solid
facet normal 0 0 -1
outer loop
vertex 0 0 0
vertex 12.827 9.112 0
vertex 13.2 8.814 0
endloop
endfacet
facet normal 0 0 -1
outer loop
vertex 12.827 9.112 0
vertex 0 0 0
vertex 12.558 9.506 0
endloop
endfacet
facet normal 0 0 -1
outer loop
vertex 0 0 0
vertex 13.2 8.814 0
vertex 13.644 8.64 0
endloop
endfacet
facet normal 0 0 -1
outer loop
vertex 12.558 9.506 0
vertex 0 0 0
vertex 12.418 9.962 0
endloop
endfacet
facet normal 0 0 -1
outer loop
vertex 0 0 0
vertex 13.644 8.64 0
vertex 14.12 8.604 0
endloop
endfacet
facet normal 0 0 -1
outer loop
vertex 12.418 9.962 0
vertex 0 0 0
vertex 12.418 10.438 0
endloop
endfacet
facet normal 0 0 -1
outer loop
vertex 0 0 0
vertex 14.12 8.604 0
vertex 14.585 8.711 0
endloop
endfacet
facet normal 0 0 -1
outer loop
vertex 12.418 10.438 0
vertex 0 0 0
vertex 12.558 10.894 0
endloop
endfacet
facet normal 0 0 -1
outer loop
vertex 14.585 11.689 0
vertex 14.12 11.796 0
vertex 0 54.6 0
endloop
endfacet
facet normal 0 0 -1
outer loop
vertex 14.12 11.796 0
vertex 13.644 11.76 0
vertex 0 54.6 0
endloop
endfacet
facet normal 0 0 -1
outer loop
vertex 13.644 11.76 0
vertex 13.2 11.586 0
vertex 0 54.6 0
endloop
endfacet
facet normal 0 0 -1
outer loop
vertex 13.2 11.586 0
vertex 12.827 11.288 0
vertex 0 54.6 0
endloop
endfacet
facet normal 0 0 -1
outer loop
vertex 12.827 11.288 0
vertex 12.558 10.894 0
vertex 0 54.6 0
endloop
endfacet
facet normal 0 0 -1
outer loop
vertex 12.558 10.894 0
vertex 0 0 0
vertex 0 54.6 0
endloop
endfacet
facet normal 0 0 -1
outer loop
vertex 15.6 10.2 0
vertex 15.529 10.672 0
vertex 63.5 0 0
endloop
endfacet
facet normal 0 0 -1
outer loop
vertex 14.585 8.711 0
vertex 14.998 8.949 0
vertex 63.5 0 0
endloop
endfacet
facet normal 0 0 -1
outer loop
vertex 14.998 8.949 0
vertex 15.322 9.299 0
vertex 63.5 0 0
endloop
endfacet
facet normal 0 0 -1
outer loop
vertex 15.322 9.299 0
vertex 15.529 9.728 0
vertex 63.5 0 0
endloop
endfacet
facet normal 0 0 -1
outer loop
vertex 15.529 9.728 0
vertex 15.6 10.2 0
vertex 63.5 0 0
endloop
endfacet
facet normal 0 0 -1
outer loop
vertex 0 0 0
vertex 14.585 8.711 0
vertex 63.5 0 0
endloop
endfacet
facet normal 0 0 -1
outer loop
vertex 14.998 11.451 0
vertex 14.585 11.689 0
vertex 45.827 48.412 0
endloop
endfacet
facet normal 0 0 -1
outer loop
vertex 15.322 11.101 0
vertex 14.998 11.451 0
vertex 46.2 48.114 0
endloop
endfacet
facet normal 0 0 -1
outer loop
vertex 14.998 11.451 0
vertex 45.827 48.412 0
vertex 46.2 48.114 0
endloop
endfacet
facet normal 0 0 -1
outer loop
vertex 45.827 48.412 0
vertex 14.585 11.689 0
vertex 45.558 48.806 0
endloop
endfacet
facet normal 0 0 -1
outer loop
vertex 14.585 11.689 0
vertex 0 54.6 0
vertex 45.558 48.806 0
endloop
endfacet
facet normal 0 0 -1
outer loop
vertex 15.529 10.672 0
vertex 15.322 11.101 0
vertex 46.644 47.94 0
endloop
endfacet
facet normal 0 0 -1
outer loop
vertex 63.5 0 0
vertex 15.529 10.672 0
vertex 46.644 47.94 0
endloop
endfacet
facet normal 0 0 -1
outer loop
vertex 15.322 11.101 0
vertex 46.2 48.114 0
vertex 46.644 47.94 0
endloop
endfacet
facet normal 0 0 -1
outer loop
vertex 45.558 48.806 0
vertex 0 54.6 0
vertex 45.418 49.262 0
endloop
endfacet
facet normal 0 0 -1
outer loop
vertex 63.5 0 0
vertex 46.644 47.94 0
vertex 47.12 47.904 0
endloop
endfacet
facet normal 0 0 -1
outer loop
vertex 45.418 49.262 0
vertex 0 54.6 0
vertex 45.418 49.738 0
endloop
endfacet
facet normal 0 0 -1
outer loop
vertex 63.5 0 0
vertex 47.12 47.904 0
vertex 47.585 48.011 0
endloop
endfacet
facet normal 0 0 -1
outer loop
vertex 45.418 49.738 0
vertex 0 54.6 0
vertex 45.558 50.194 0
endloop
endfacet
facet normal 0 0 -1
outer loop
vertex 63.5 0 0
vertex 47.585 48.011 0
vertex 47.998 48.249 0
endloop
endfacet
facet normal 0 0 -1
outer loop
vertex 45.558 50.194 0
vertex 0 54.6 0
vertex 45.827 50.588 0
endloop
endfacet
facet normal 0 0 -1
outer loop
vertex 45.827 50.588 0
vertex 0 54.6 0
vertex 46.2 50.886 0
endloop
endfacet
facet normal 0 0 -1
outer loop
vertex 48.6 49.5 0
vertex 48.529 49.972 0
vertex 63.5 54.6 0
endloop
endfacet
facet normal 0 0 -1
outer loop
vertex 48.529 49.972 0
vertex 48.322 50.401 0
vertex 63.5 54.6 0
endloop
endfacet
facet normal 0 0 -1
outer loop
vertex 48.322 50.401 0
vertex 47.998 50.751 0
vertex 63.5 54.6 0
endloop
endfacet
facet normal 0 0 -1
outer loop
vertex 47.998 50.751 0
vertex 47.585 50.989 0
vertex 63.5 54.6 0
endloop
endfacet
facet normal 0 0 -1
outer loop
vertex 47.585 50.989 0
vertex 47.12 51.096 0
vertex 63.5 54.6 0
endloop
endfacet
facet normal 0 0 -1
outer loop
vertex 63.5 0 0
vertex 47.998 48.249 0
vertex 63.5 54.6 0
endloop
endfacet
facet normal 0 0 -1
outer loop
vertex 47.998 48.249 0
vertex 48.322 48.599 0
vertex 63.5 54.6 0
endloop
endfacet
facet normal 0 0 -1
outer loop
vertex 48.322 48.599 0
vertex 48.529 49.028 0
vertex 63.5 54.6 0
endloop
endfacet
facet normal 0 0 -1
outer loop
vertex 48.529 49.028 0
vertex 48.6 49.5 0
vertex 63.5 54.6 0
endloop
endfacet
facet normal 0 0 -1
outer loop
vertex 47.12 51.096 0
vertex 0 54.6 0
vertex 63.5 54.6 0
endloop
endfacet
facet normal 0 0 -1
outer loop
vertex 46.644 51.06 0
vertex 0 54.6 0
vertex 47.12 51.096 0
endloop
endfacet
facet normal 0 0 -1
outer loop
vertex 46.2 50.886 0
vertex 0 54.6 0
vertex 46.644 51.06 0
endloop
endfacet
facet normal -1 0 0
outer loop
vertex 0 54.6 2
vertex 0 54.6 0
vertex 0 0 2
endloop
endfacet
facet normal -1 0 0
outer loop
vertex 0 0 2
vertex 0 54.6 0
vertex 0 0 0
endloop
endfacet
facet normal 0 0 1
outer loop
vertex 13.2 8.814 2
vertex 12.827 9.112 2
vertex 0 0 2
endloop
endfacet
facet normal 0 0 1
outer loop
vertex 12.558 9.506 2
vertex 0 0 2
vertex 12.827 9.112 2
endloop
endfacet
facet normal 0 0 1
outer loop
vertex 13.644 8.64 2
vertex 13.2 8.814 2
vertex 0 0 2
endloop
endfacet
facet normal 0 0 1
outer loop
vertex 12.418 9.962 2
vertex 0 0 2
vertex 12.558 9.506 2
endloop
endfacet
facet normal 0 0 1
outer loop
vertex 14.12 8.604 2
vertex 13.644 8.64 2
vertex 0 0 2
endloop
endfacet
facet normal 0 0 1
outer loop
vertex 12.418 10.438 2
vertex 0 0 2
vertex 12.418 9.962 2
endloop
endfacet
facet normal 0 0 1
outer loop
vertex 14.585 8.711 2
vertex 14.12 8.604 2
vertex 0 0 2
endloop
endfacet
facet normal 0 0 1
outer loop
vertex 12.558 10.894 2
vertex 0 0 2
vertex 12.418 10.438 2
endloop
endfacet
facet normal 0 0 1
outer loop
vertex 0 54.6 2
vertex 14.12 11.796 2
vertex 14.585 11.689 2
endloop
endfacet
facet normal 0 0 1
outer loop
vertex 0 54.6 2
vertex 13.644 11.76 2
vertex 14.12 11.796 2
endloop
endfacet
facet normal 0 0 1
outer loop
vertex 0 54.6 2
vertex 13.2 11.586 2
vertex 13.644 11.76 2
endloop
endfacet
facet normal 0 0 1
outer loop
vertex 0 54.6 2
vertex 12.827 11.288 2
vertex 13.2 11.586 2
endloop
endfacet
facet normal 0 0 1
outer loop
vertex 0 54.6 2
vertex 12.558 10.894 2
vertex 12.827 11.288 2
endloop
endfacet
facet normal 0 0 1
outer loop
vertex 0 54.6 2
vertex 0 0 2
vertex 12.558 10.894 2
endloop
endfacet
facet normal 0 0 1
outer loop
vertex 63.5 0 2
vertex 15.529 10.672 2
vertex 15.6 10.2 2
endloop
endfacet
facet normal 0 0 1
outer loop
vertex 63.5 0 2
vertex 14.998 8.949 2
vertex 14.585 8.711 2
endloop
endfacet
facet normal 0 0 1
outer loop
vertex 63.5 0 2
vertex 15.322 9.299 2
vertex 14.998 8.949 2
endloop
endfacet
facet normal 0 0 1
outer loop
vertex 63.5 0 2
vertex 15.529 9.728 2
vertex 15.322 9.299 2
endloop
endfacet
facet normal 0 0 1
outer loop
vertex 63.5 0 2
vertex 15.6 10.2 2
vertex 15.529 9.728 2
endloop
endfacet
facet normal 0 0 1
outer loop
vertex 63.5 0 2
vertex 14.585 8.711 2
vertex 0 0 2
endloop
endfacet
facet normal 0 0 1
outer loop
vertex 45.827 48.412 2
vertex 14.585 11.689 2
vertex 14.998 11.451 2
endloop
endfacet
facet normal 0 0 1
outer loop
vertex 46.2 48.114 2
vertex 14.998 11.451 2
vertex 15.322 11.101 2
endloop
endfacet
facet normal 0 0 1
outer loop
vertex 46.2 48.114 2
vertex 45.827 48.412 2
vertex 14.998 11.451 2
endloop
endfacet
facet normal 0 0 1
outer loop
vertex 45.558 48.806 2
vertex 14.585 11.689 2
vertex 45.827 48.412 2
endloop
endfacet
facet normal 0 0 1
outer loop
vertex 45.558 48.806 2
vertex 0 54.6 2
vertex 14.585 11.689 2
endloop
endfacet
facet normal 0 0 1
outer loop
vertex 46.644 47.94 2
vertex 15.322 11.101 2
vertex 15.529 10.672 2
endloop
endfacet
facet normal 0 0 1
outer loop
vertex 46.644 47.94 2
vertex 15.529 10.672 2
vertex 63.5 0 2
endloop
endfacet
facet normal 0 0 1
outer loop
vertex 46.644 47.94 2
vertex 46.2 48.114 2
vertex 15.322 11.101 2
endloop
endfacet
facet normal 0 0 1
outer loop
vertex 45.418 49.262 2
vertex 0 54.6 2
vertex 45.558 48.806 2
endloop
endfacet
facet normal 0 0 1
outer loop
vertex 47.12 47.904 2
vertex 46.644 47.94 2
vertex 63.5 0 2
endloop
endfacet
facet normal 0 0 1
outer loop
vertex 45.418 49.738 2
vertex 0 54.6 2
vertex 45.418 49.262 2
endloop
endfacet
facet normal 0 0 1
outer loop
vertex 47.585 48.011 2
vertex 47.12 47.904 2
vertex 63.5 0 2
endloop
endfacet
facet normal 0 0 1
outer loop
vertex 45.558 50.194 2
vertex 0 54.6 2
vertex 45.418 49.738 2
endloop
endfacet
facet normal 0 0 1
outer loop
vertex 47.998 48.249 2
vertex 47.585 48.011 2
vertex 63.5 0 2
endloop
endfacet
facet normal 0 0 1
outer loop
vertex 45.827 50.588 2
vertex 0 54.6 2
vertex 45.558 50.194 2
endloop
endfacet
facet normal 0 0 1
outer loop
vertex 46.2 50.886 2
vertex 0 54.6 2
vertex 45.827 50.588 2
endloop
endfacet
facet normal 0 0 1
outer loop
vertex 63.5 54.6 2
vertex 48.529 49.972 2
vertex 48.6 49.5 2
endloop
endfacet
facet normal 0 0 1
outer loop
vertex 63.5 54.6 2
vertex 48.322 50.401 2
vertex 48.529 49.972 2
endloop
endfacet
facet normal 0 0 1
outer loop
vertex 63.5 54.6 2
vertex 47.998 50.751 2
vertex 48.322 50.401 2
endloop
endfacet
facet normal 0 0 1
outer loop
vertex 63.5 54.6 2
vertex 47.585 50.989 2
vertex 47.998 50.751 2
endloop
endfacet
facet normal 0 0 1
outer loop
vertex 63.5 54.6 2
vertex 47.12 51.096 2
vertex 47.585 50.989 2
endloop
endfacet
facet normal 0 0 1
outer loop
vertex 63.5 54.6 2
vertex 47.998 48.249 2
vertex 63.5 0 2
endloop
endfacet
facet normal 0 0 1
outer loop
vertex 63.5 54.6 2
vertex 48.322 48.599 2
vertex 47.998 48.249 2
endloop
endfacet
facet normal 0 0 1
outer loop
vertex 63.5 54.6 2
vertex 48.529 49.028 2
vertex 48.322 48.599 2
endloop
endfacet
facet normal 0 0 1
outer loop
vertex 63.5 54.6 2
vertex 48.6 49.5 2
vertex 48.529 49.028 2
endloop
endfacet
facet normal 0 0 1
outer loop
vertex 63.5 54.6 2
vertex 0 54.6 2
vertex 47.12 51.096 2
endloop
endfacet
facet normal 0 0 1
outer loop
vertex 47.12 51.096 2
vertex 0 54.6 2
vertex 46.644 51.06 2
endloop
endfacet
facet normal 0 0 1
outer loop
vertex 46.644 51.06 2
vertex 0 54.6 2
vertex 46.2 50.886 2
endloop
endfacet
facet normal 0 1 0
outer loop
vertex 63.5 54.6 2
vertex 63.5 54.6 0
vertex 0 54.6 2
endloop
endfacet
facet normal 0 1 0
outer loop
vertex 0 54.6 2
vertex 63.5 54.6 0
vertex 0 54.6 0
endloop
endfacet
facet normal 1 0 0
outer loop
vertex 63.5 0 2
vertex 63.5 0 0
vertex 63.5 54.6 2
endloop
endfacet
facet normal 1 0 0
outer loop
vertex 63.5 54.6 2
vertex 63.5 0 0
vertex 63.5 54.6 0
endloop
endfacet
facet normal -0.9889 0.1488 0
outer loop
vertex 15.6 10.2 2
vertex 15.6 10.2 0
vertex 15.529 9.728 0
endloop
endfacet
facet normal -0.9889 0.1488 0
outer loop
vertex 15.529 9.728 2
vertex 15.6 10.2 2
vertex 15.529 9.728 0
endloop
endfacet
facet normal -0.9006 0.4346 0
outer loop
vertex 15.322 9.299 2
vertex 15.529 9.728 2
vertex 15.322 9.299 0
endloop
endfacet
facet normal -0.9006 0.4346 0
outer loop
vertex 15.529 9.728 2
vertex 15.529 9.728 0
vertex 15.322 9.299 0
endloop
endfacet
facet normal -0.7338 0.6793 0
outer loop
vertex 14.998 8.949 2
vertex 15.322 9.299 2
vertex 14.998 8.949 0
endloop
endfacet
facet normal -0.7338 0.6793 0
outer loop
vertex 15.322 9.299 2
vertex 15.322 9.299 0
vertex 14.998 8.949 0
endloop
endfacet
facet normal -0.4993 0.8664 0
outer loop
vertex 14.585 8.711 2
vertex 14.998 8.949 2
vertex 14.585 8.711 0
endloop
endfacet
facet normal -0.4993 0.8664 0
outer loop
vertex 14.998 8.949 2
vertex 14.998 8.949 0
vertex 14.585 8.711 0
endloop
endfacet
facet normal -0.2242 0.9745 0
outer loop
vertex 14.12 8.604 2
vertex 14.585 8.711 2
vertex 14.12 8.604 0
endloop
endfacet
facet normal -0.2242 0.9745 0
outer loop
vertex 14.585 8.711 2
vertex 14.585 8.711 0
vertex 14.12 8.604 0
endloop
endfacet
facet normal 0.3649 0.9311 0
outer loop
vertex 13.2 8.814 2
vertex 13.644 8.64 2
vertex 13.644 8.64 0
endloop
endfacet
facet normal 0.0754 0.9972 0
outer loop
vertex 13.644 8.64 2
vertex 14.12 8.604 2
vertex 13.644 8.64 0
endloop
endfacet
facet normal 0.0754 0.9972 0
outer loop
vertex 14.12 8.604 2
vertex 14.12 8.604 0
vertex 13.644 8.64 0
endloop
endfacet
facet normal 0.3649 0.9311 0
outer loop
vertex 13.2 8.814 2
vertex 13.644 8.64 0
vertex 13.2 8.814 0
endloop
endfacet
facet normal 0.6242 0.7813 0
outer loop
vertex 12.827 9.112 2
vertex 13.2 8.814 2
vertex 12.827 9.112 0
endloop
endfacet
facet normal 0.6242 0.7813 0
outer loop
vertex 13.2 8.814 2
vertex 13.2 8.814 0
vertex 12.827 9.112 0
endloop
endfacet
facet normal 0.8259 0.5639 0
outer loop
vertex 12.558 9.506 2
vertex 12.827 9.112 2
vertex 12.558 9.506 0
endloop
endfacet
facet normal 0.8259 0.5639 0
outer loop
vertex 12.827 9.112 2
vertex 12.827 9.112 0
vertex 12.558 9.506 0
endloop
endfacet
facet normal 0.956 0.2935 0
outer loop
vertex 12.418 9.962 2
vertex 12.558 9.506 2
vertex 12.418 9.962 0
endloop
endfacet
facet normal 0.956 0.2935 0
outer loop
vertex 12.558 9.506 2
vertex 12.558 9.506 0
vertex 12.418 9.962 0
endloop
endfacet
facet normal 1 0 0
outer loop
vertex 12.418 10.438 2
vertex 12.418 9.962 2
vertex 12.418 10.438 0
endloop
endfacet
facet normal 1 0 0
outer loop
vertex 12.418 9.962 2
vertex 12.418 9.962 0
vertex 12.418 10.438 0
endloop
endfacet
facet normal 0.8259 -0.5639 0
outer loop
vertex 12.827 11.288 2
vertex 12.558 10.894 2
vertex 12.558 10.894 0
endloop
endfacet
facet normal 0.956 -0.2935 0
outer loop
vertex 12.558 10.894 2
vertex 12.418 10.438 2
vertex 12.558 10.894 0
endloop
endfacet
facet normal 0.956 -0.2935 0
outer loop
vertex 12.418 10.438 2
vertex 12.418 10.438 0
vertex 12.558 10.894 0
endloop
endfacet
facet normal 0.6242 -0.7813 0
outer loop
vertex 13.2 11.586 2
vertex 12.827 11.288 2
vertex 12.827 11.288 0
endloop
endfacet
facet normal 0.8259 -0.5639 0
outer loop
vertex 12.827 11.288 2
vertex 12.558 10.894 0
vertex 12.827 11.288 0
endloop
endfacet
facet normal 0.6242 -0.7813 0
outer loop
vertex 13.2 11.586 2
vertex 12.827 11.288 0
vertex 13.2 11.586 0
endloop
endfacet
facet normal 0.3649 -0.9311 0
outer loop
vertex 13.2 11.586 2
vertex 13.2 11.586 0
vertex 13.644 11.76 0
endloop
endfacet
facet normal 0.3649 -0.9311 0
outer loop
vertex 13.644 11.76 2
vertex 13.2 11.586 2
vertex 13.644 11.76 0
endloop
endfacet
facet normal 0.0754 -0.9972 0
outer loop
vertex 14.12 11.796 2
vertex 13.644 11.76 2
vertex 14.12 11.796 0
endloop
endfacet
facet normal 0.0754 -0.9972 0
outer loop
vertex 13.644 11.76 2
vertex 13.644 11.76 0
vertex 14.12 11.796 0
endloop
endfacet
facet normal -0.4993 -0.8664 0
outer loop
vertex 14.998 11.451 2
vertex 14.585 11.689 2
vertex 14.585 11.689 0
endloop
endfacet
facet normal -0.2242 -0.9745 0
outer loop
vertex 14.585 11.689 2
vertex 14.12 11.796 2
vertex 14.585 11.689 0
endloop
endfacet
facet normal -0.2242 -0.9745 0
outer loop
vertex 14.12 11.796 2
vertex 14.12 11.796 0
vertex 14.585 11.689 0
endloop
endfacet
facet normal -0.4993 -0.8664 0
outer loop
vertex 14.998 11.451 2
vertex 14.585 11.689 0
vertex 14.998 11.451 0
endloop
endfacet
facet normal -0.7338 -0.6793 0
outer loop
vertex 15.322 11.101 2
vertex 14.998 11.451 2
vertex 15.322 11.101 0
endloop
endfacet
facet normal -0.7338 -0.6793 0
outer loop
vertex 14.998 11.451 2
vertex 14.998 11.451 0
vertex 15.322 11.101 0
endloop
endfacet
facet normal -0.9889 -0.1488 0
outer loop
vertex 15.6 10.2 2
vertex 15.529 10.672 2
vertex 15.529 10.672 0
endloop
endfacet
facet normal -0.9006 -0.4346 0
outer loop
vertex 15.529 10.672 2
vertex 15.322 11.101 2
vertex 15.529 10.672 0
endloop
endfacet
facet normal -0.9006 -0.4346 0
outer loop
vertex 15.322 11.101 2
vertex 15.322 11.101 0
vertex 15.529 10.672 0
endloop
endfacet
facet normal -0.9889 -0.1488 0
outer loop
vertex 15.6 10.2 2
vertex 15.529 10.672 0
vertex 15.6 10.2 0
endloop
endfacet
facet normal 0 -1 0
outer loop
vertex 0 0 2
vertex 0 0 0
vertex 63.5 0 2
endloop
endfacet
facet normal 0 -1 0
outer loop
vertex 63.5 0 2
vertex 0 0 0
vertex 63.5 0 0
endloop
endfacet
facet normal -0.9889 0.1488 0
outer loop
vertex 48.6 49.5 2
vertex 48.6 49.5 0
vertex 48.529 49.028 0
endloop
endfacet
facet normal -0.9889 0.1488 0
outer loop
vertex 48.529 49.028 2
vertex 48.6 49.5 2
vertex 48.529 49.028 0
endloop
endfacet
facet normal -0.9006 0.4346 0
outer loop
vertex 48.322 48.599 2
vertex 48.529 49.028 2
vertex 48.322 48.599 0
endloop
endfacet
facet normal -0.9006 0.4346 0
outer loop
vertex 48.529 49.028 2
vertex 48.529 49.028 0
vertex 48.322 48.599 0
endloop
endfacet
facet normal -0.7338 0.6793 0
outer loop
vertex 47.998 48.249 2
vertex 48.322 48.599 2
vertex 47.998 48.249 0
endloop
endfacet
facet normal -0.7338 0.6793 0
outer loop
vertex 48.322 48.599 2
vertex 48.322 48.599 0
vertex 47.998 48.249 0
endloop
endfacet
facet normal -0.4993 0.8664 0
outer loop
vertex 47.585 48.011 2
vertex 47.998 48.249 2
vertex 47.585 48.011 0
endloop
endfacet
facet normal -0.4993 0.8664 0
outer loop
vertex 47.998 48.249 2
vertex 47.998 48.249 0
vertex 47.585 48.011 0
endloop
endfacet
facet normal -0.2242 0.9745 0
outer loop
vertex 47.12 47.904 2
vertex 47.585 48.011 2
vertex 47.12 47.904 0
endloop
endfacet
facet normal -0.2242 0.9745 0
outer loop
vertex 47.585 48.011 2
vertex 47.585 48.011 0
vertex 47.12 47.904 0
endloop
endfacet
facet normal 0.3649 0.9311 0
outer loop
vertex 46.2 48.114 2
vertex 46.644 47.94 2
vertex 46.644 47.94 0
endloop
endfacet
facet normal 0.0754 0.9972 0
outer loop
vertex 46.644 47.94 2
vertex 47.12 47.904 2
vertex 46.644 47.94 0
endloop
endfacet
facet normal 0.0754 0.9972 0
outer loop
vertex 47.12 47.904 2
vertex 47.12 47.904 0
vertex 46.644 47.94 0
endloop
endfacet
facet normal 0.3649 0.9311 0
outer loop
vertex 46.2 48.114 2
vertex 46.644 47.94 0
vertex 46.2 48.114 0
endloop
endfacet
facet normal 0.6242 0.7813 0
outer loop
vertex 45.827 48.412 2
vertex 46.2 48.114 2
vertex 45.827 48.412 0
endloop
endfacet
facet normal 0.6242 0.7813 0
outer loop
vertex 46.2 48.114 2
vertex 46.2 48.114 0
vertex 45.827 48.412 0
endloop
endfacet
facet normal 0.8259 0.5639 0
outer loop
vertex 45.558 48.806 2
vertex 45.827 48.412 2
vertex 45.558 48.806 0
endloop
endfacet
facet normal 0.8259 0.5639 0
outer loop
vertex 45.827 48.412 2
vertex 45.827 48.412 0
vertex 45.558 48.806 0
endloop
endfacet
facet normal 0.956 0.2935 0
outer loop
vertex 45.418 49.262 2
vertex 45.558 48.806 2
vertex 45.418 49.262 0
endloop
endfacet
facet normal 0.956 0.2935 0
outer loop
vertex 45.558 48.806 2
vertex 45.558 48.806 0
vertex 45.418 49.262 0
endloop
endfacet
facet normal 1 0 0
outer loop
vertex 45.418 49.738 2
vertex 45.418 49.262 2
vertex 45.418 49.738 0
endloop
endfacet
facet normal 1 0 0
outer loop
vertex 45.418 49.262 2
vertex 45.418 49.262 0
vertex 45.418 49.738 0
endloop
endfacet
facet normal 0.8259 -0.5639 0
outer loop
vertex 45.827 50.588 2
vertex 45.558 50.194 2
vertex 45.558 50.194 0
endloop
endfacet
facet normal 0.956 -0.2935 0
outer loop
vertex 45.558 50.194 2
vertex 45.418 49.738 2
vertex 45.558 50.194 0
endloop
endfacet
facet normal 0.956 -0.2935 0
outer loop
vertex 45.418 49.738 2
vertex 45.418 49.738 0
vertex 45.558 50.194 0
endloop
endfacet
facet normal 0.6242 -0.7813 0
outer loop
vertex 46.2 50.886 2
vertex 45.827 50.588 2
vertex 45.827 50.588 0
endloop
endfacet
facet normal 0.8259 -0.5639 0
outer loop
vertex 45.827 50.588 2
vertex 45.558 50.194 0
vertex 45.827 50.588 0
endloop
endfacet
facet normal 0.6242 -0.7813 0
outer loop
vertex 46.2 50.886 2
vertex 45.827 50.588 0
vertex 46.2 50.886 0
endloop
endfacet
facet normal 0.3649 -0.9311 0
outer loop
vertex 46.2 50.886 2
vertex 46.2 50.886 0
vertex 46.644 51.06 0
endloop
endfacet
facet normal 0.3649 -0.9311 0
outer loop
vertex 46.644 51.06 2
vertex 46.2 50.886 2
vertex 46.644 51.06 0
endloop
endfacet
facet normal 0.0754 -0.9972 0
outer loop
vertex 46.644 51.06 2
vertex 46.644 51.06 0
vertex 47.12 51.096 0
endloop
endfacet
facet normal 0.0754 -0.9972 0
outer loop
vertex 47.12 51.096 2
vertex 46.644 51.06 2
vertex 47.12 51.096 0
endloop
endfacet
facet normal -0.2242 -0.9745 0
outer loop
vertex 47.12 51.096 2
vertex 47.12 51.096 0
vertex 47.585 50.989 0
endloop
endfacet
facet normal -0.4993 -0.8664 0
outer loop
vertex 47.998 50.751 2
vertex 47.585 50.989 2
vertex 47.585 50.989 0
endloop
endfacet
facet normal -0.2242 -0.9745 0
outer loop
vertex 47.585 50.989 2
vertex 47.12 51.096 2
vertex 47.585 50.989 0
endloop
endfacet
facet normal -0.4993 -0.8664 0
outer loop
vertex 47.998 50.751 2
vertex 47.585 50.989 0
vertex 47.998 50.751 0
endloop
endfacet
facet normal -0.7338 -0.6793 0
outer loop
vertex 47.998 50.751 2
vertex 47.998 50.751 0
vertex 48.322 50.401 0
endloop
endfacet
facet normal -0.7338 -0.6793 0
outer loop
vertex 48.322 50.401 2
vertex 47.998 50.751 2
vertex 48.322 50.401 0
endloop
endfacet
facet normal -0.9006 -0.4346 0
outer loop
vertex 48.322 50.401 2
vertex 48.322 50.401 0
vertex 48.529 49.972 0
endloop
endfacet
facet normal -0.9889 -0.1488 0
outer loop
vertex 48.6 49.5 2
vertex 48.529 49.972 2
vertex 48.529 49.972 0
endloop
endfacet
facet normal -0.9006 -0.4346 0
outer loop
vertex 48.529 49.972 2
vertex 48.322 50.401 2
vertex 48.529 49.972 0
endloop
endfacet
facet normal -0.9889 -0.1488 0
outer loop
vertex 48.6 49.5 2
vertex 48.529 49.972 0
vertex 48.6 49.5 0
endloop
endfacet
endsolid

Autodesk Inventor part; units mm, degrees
ref_plane "YZ Plane" through (0, 0, 0) normal (1, 0, 0) x (0, 1, 0)
ref_plane "XZ Plane" through (0, 0, 0) normal (0, 1, 0) x (-1, 0, 0)
ref_plane "XY Plane" through (0, 0, 0) normal (0, 0, 1) x (1, 0, 0)
sketch "Skizze1" plane through (0, 0, 0) normal (0, 0, 1) x (1, 0, 0)
  line L0 (0, 0) -> (63.5, 0)
  line L1 (63.5, 0) -> (63.5, 54.6)
  line L2 (63.5, 54.6) -> (0, 54.6)
  line L3 (0, 54.6) -> (0, 0)
  circle A0 centre (14, 10.2) radius 1.6
  circle A1 centre (47, 49.5) radius 1.6
  dimension "d0" = 54.6
  dimension "d1" = 63.5
  dimension "d2" = 3.2
  dimension "d3" = 3.2
  dimension "d4" = 14
  dimension "d5" = 10.2
  dimension "d6" = 49.5
  dimension "d7" = 47
  dimension "d10" = 33
  dimension "d11" = 39.3
extrude "Extrusion1" add sketch "Skizze1" along normal blind 2
properties part number "SMD_Platine"
